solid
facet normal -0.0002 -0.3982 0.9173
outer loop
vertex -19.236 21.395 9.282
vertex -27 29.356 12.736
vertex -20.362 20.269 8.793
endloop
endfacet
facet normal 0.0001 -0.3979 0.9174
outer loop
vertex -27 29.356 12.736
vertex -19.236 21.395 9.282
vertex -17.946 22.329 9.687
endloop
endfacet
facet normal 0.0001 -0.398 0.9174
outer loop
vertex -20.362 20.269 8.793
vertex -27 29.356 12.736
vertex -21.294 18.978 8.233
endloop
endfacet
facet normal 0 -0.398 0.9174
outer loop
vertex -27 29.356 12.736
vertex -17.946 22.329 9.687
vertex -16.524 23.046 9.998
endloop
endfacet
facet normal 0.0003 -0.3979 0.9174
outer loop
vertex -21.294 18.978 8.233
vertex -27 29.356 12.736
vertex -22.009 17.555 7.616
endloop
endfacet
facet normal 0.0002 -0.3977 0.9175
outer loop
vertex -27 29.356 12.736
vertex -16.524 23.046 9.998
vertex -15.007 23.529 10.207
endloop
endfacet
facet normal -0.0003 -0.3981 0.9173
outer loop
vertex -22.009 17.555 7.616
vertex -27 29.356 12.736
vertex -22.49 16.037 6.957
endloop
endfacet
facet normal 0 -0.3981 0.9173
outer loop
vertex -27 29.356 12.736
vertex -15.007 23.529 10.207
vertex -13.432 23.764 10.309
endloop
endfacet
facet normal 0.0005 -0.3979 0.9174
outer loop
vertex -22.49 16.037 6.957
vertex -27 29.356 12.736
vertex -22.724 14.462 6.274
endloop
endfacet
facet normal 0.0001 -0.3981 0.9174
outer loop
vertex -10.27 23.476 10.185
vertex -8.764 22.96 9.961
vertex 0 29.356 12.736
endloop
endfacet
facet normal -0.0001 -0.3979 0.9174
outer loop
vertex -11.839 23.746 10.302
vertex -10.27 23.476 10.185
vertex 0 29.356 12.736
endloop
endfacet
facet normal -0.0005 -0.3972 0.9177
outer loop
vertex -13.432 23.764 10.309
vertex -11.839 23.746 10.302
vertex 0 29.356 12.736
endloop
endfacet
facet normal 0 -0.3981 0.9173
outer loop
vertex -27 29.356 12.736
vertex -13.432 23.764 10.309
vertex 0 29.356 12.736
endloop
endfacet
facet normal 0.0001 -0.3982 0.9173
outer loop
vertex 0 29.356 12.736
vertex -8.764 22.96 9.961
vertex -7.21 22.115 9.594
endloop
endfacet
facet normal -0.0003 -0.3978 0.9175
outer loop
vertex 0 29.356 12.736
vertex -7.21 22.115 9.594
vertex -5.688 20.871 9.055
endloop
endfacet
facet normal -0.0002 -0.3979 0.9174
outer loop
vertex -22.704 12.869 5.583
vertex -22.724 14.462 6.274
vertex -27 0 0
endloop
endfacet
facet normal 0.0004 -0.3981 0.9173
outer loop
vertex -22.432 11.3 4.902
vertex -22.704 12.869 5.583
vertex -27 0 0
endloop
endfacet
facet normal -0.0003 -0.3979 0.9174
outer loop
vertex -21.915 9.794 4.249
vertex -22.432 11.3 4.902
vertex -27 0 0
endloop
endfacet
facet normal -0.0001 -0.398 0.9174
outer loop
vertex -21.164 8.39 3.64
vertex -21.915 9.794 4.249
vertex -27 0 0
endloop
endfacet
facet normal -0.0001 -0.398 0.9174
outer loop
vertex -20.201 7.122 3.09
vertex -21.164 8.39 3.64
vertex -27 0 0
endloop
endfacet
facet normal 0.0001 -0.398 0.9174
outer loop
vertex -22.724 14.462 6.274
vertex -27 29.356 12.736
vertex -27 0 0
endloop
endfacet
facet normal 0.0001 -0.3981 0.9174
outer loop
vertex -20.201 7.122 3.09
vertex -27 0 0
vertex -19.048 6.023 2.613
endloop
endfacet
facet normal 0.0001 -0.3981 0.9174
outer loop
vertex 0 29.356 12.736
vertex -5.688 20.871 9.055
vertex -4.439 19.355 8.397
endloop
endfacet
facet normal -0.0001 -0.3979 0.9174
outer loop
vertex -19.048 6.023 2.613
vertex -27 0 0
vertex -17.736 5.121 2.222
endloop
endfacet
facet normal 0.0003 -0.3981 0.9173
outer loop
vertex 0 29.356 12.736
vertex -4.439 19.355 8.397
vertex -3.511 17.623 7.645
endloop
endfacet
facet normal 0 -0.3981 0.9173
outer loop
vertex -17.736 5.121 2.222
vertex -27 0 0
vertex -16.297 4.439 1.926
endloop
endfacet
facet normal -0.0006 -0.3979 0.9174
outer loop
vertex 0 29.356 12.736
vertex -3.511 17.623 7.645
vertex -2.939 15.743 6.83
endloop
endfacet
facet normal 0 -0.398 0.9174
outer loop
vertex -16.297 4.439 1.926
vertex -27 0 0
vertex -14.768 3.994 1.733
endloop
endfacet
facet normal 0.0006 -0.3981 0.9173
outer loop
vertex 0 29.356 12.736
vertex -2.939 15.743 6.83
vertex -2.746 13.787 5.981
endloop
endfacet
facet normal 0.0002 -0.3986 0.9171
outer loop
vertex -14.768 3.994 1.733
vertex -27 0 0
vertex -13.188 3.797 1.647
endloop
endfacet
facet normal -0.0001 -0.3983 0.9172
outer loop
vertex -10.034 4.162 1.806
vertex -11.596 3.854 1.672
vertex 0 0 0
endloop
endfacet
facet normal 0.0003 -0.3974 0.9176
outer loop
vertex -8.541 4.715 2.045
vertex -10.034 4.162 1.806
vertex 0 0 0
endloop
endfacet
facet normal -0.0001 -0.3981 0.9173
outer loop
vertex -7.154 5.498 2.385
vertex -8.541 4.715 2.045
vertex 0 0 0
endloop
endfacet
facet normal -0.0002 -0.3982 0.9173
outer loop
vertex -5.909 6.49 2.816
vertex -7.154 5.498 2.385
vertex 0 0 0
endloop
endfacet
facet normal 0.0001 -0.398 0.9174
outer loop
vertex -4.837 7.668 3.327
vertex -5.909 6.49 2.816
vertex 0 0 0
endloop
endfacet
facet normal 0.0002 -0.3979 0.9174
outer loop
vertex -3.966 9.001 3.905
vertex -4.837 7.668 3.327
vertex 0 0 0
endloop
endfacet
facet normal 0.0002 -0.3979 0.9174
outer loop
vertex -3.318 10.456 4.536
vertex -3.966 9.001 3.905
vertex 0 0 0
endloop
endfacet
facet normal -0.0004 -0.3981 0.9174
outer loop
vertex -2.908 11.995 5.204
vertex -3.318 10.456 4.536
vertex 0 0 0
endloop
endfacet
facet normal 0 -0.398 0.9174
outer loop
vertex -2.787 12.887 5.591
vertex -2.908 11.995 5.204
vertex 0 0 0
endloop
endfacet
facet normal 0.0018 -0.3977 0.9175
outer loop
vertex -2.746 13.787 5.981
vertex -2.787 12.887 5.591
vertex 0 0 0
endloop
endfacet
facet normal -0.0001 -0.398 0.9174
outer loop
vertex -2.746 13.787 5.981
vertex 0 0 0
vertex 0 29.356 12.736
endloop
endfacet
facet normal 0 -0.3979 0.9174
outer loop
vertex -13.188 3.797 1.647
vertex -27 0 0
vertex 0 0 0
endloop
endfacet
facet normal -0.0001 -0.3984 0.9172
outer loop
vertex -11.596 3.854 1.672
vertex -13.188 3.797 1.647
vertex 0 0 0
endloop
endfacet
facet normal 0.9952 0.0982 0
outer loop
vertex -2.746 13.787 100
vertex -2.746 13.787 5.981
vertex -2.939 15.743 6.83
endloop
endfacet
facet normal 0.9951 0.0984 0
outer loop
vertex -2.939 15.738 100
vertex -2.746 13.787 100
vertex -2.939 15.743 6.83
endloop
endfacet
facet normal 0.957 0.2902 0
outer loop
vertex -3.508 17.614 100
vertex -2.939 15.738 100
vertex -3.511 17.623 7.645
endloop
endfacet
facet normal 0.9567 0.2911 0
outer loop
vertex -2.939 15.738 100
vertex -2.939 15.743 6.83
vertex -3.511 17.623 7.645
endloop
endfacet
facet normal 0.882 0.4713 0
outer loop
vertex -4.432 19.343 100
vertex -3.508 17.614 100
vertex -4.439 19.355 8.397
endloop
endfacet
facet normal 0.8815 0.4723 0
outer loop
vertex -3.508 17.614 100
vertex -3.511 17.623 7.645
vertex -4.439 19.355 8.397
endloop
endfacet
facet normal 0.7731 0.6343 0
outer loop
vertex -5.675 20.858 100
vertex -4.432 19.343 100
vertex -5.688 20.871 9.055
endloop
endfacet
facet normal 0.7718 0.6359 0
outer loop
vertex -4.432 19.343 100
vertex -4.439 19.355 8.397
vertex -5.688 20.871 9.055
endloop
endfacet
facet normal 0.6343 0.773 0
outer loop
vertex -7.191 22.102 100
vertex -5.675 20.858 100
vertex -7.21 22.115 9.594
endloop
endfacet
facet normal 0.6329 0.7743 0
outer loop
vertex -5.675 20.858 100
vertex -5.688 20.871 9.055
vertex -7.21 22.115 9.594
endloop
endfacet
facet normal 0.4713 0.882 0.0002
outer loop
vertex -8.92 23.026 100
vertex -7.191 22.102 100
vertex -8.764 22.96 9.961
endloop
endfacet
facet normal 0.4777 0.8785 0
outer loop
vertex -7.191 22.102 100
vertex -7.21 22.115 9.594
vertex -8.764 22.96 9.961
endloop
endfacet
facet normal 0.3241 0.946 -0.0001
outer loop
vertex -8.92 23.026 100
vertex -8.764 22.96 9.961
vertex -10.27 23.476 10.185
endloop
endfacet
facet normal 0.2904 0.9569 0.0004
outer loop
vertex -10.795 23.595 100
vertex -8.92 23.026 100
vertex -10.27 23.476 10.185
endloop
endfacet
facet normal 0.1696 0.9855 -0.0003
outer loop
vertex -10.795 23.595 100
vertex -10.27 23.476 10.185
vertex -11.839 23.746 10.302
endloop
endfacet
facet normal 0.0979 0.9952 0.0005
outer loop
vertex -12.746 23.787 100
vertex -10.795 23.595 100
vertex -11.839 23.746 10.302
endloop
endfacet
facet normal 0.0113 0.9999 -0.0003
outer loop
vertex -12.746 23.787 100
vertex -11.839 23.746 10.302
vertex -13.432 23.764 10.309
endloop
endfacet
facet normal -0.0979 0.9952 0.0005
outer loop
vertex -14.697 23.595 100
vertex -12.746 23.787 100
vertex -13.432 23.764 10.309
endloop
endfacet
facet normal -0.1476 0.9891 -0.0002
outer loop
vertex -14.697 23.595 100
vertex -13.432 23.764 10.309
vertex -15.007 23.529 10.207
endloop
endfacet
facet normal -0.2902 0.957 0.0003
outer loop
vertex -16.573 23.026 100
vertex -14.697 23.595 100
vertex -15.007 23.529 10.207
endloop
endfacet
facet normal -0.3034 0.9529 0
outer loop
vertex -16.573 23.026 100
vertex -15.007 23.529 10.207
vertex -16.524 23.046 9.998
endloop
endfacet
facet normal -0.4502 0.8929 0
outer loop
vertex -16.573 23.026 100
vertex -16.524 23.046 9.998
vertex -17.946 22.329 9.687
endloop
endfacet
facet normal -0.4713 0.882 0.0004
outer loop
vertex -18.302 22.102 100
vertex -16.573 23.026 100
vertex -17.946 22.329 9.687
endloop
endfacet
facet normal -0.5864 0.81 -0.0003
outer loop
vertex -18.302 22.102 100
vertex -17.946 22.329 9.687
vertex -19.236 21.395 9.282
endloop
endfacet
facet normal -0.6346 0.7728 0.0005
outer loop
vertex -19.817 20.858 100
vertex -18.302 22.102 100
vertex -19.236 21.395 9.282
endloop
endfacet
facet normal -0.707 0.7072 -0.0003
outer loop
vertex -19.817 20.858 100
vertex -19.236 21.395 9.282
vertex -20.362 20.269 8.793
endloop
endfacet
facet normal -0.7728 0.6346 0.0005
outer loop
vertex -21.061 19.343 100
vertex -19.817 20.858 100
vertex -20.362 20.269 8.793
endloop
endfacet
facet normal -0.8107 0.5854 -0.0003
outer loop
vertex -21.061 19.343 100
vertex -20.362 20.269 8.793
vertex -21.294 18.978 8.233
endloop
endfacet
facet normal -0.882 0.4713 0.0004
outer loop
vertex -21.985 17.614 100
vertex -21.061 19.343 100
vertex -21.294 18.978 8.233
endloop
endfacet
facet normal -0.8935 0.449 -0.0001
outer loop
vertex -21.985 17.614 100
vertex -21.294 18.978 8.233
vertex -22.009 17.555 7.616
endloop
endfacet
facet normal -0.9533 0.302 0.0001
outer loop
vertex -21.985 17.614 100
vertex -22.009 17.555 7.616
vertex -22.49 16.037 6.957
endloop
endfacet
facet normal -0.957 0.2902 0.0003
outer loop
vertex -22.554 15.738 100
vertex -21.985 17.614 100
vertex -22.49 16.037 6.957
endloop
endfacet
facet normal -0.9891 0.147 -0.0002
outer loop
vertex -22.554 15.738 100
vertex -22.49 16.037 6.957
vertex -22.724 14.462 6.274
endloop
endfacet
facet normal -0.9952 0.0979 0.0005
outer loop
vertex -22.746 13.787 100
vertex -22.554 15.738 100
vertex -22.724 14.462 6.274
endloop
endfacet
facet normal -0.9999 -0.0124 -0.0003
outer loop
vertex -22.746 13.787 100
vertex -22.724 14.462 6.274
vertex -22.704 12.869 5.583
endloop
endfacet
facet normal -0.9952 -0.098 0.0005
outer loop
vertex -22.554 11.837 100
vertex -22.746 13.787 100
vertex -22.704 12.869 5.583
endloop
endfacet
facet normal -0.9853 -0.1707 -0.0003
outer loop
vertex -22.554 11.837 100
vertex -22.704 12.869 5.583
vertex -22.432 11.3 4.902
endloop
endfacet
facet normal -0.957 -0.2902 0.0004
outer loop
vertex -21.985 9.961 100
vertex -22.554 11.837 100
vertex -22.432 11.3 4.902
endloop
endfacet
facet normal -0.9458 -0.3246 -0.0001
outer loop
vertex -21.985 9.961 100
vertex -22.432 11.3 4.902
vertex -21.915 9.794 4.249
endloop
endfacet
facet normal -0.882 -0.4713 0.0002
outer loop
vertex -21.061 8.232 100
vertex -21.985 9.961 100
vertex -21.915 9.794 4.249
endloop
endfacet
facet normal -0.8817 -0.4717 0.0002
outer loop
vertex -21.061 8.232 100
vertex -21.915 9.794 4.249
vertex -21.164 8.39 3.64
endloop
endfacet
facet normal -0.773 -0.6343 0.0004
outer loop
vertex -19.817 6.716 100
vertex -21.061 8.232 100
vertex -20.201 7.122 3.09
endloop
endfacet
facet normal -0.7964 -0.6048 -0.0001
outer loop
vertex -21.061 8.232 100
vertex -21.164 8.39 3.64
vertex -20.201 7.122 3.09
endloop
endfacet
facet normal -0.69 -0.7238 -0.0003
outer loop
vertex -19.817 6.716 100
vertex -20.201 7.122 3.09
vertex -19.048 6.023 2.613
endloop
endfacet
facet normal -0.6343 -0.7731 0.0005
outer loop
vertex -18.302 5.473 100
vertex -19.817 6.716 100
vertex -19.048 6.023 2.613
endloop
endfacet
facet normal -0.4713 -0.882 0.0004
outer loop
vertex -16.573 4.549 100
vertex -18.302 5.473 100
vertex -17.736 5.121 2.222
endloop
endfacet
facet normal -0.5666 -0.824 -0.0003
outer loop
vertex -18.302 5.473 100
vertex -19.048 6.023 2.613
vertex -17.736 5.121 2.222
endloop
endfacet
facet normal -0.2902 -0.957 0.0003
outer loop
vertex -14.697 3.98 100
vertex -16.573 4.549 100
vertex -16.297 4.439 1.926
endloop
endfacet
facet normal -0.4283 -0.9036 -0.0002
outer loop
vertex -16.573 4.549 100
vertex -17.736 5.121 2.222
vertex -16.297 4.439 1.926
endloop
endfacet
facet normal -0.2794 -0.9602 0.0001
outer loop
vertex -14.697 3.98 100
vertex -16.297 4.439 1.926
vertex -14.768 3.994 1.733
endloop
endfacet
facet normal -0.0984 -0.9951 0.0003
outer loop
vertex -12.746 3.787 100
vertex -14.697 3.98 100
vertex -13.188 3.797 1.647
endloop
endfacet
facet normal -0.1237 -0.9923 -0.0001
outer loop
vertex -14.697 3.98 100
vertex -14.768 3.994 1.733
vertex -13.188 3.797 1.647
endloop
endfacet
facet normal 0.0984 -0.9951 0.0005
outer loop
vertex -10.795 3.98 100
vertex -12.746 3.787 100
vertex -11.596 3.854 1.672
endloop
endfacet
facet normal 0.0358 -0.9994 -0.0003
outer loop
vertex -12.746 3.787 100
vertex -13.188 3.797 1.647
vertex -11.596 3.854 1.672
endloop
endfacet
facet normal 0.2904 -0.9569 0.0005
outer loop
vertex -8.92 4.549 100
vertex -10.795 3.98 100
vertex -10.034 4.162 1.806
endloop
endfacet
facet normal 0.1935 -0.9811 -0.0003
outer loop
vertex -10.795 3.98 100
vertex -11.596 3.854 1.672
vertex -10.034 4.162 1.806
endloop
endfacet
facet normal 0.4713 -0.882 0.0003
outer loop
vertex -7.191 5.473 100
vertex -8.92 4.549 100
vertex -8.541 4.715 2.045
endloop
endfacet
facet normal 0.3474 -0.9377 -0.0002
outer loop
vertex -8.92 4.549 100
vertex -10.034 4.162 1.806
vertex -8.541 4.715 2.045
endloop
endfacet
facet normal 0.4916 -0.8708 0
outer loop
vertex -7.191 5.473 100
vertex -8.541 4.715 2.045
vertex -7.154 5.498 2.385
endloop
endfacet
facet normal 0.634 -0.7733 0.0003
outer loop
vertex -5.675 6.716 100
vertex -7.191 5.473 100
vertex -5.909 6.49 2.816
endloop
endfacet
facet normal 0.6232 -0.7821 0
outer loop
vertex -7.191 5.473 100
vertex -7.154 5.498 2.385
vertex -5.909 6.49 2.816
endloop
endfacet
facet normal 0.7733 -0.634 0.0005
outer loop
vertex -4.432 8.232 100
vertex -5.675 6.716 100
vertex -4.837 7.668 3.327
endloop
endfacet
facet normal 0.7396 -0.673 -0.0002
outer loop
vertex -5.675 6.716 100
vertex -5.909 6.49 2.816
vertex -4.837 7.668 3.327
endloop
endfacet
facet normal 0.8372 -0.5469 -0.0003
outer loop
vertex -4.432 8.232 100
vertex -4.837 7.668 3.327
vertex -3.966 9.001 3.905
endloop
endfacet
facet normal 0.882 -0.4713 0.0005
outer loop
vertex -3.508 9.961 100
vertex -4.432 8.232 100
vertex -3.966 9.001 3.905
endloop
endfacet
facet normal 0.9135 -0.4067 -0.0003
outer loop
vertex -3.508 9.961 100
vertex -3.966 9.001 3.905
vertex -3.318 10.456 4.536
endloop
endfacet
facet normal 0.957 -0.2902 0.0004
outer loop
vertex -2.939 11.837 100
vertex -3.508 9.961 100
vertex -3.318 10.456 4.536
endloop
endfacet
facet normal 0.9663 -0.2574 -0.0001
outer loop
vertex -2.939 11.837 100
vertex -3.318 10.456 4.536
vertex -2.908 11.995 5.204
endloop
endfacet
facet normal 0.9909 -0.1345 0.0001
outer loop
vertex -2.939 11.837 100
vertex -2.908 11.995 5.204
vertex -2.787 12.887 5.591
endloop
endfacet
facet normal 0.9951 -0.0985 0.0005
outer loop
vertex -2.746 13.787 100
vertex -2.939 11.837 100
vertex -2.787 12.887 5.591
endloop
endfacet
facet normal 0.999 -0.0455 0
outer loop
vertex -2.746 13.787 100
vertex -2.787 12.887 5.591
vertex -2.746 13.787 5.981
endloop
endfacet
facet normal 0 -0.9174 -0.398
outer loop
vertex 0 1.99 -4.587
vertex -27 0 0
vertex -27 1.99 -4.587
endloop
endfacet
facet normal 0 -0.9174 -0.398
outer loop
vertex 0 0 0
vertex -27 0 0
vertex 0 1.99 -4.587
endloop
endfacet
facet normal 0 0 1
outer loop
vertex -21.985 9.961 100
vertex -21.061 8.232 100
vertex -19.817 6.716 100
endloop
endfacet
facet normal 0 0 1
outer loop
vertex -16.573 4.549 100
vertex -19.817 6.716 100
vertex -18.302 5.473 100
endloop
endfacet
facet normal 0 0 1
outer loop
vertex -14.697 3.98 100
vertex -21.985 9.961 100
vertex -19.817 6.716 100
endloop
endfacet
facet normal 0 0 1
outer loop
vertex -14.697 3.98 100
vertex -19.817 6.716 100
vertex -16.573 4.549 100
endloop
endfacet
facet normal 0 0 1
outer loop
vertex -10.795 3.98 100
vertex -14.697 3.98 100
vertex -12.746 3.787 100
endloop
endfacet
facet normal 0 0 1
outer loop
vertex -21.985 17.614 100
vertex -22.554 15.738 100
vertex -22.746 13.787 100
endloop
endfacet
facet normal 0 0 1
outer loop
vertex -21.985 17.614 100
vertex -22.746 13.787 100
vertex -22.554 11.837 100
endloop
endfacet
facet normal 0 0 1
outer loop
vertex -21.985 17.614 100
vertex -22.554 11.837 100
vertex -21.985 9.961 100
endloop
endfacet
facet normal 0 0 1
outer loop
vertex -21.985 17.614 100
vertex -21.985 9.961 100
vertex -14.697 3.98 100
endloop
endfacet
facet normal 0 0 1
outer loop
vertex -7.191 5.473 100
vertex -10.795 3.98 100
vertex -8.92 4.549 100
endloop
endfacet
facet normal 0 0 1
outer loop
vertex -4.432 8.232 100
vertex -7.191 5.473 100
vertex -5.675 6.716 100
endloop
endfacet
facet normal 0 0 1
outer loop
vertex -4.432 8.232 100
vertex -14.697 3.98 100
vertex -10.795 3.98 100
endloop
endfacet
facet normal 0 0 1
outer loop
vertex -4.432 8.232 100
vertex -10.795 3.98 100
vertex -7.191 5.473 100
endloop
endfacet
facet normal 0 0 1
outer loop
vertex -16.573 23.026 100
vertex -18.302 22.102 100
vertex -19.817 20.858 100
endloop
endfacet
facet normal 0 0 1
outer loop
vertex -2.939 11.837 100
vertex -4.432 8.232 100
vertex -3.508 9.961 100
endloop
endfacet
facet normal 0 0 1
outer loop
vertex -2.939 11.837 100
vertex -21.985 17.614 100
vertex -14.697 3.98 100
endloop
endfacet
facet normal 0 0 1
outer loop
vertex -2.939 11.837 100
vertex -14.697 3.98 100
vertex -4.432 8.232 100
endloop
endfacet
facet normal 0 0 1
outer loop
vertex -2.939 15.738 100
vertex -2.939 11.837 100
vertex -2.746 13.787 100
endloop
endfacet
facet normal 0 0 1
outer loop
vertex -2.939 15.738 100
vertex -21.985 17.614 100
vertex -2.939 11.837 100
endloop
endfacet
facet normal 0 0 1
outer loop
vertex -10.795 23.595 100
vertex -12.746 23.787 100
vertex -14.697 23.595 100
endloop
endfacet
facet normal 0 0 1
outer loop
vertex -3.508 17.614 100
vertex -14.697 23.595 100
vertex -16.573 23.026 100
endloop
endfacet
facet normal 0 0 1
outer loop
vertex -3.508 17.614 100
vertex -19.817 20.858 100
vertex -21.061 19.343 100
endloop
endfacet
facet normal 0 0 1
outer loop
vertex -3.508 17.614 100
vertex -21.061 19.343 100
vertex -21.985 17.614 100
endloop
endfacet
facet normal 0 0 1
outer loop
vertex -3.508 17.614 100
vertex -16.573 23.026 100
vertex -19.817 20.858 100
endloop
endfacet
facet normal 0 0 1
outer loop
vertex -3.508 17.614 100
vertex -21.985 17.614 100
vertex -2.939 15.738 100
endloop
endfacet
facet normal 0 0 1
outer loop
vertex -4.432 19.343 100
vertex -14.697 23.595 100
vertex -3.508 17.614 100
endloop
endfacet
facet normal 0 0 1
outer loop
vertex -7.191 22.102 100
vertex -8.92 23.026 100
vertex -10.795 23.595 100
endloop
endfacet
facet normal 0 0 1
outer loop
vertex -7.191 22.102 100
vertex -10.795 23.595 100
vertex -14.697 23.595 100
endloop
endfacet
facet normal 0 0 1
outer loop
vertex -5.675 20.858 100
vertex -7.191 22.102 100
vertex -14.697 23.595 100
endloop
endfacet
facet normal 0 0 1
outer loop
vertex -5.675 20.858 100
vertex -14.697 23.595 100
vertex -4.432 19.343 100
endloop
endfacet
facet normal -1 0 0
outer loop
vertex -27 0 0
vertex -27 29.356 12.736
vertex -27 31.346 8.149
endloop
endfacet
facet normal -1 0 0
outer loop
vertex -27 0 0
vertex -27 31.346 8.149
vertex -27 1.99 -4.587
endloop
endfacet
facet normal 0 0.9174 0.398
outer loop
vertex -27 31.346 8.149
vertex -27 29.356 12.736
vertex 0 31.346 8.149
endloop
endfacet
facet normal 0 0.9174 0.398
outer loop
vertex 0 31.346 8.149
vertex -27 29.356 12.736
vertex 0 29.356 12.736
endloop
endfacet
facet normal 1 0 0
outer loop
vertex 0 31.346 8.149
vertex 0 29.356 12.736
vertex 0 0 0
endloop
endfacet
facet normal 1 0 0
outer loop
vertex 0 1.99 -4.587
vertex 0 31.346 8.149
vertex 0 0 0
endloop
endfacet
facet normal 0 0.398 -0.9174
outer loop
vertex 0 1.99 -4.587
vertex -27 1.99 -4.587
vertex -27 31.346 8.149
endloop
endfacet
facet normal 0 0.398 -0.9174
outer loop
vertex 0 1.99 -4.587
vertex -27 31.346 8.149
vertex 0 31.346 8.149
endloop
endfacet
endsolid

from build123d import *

# Parameters (mm, degrees)
F0_R     = 10
F1_DEPTH = 100
F3_DEPTH = 25
F4_W     = 27
F4_H     = 32
F5_DEPTH = 5


with BuildPart() as f1:
    # F0 (on Top) → F1 (new body)
    with BuildSketch(Plane.XY):
        with Locations((-12.7463750541, 13.7874316424)):
            Circle(F0_R)
    extrude(amount=F1_DEPTH)

    # F2 (on Right) → F3 (cut)
    with BuildSketch(Plane.YZ):
        Polygon((35.4767926037, 15.3907770291), (0, 0), (35.4767926037, 0), align=None)
    extrude(amount=-F3_DEPTH, mode=Mode.SUBTRACT)

    # F4 (on face) → F5 (join)
    with BuildSketch(Plane(origin=(0, 0, 0), x_dir=(1, 0, 0), z_dir=(0, 0.3979883977, -0.9173904487))):
        with Locations((-13.5, -16)):
            Rectangle(F4_W, F4_H)
    extrude(amount=F5_DEPTH)


solid = f1.part
